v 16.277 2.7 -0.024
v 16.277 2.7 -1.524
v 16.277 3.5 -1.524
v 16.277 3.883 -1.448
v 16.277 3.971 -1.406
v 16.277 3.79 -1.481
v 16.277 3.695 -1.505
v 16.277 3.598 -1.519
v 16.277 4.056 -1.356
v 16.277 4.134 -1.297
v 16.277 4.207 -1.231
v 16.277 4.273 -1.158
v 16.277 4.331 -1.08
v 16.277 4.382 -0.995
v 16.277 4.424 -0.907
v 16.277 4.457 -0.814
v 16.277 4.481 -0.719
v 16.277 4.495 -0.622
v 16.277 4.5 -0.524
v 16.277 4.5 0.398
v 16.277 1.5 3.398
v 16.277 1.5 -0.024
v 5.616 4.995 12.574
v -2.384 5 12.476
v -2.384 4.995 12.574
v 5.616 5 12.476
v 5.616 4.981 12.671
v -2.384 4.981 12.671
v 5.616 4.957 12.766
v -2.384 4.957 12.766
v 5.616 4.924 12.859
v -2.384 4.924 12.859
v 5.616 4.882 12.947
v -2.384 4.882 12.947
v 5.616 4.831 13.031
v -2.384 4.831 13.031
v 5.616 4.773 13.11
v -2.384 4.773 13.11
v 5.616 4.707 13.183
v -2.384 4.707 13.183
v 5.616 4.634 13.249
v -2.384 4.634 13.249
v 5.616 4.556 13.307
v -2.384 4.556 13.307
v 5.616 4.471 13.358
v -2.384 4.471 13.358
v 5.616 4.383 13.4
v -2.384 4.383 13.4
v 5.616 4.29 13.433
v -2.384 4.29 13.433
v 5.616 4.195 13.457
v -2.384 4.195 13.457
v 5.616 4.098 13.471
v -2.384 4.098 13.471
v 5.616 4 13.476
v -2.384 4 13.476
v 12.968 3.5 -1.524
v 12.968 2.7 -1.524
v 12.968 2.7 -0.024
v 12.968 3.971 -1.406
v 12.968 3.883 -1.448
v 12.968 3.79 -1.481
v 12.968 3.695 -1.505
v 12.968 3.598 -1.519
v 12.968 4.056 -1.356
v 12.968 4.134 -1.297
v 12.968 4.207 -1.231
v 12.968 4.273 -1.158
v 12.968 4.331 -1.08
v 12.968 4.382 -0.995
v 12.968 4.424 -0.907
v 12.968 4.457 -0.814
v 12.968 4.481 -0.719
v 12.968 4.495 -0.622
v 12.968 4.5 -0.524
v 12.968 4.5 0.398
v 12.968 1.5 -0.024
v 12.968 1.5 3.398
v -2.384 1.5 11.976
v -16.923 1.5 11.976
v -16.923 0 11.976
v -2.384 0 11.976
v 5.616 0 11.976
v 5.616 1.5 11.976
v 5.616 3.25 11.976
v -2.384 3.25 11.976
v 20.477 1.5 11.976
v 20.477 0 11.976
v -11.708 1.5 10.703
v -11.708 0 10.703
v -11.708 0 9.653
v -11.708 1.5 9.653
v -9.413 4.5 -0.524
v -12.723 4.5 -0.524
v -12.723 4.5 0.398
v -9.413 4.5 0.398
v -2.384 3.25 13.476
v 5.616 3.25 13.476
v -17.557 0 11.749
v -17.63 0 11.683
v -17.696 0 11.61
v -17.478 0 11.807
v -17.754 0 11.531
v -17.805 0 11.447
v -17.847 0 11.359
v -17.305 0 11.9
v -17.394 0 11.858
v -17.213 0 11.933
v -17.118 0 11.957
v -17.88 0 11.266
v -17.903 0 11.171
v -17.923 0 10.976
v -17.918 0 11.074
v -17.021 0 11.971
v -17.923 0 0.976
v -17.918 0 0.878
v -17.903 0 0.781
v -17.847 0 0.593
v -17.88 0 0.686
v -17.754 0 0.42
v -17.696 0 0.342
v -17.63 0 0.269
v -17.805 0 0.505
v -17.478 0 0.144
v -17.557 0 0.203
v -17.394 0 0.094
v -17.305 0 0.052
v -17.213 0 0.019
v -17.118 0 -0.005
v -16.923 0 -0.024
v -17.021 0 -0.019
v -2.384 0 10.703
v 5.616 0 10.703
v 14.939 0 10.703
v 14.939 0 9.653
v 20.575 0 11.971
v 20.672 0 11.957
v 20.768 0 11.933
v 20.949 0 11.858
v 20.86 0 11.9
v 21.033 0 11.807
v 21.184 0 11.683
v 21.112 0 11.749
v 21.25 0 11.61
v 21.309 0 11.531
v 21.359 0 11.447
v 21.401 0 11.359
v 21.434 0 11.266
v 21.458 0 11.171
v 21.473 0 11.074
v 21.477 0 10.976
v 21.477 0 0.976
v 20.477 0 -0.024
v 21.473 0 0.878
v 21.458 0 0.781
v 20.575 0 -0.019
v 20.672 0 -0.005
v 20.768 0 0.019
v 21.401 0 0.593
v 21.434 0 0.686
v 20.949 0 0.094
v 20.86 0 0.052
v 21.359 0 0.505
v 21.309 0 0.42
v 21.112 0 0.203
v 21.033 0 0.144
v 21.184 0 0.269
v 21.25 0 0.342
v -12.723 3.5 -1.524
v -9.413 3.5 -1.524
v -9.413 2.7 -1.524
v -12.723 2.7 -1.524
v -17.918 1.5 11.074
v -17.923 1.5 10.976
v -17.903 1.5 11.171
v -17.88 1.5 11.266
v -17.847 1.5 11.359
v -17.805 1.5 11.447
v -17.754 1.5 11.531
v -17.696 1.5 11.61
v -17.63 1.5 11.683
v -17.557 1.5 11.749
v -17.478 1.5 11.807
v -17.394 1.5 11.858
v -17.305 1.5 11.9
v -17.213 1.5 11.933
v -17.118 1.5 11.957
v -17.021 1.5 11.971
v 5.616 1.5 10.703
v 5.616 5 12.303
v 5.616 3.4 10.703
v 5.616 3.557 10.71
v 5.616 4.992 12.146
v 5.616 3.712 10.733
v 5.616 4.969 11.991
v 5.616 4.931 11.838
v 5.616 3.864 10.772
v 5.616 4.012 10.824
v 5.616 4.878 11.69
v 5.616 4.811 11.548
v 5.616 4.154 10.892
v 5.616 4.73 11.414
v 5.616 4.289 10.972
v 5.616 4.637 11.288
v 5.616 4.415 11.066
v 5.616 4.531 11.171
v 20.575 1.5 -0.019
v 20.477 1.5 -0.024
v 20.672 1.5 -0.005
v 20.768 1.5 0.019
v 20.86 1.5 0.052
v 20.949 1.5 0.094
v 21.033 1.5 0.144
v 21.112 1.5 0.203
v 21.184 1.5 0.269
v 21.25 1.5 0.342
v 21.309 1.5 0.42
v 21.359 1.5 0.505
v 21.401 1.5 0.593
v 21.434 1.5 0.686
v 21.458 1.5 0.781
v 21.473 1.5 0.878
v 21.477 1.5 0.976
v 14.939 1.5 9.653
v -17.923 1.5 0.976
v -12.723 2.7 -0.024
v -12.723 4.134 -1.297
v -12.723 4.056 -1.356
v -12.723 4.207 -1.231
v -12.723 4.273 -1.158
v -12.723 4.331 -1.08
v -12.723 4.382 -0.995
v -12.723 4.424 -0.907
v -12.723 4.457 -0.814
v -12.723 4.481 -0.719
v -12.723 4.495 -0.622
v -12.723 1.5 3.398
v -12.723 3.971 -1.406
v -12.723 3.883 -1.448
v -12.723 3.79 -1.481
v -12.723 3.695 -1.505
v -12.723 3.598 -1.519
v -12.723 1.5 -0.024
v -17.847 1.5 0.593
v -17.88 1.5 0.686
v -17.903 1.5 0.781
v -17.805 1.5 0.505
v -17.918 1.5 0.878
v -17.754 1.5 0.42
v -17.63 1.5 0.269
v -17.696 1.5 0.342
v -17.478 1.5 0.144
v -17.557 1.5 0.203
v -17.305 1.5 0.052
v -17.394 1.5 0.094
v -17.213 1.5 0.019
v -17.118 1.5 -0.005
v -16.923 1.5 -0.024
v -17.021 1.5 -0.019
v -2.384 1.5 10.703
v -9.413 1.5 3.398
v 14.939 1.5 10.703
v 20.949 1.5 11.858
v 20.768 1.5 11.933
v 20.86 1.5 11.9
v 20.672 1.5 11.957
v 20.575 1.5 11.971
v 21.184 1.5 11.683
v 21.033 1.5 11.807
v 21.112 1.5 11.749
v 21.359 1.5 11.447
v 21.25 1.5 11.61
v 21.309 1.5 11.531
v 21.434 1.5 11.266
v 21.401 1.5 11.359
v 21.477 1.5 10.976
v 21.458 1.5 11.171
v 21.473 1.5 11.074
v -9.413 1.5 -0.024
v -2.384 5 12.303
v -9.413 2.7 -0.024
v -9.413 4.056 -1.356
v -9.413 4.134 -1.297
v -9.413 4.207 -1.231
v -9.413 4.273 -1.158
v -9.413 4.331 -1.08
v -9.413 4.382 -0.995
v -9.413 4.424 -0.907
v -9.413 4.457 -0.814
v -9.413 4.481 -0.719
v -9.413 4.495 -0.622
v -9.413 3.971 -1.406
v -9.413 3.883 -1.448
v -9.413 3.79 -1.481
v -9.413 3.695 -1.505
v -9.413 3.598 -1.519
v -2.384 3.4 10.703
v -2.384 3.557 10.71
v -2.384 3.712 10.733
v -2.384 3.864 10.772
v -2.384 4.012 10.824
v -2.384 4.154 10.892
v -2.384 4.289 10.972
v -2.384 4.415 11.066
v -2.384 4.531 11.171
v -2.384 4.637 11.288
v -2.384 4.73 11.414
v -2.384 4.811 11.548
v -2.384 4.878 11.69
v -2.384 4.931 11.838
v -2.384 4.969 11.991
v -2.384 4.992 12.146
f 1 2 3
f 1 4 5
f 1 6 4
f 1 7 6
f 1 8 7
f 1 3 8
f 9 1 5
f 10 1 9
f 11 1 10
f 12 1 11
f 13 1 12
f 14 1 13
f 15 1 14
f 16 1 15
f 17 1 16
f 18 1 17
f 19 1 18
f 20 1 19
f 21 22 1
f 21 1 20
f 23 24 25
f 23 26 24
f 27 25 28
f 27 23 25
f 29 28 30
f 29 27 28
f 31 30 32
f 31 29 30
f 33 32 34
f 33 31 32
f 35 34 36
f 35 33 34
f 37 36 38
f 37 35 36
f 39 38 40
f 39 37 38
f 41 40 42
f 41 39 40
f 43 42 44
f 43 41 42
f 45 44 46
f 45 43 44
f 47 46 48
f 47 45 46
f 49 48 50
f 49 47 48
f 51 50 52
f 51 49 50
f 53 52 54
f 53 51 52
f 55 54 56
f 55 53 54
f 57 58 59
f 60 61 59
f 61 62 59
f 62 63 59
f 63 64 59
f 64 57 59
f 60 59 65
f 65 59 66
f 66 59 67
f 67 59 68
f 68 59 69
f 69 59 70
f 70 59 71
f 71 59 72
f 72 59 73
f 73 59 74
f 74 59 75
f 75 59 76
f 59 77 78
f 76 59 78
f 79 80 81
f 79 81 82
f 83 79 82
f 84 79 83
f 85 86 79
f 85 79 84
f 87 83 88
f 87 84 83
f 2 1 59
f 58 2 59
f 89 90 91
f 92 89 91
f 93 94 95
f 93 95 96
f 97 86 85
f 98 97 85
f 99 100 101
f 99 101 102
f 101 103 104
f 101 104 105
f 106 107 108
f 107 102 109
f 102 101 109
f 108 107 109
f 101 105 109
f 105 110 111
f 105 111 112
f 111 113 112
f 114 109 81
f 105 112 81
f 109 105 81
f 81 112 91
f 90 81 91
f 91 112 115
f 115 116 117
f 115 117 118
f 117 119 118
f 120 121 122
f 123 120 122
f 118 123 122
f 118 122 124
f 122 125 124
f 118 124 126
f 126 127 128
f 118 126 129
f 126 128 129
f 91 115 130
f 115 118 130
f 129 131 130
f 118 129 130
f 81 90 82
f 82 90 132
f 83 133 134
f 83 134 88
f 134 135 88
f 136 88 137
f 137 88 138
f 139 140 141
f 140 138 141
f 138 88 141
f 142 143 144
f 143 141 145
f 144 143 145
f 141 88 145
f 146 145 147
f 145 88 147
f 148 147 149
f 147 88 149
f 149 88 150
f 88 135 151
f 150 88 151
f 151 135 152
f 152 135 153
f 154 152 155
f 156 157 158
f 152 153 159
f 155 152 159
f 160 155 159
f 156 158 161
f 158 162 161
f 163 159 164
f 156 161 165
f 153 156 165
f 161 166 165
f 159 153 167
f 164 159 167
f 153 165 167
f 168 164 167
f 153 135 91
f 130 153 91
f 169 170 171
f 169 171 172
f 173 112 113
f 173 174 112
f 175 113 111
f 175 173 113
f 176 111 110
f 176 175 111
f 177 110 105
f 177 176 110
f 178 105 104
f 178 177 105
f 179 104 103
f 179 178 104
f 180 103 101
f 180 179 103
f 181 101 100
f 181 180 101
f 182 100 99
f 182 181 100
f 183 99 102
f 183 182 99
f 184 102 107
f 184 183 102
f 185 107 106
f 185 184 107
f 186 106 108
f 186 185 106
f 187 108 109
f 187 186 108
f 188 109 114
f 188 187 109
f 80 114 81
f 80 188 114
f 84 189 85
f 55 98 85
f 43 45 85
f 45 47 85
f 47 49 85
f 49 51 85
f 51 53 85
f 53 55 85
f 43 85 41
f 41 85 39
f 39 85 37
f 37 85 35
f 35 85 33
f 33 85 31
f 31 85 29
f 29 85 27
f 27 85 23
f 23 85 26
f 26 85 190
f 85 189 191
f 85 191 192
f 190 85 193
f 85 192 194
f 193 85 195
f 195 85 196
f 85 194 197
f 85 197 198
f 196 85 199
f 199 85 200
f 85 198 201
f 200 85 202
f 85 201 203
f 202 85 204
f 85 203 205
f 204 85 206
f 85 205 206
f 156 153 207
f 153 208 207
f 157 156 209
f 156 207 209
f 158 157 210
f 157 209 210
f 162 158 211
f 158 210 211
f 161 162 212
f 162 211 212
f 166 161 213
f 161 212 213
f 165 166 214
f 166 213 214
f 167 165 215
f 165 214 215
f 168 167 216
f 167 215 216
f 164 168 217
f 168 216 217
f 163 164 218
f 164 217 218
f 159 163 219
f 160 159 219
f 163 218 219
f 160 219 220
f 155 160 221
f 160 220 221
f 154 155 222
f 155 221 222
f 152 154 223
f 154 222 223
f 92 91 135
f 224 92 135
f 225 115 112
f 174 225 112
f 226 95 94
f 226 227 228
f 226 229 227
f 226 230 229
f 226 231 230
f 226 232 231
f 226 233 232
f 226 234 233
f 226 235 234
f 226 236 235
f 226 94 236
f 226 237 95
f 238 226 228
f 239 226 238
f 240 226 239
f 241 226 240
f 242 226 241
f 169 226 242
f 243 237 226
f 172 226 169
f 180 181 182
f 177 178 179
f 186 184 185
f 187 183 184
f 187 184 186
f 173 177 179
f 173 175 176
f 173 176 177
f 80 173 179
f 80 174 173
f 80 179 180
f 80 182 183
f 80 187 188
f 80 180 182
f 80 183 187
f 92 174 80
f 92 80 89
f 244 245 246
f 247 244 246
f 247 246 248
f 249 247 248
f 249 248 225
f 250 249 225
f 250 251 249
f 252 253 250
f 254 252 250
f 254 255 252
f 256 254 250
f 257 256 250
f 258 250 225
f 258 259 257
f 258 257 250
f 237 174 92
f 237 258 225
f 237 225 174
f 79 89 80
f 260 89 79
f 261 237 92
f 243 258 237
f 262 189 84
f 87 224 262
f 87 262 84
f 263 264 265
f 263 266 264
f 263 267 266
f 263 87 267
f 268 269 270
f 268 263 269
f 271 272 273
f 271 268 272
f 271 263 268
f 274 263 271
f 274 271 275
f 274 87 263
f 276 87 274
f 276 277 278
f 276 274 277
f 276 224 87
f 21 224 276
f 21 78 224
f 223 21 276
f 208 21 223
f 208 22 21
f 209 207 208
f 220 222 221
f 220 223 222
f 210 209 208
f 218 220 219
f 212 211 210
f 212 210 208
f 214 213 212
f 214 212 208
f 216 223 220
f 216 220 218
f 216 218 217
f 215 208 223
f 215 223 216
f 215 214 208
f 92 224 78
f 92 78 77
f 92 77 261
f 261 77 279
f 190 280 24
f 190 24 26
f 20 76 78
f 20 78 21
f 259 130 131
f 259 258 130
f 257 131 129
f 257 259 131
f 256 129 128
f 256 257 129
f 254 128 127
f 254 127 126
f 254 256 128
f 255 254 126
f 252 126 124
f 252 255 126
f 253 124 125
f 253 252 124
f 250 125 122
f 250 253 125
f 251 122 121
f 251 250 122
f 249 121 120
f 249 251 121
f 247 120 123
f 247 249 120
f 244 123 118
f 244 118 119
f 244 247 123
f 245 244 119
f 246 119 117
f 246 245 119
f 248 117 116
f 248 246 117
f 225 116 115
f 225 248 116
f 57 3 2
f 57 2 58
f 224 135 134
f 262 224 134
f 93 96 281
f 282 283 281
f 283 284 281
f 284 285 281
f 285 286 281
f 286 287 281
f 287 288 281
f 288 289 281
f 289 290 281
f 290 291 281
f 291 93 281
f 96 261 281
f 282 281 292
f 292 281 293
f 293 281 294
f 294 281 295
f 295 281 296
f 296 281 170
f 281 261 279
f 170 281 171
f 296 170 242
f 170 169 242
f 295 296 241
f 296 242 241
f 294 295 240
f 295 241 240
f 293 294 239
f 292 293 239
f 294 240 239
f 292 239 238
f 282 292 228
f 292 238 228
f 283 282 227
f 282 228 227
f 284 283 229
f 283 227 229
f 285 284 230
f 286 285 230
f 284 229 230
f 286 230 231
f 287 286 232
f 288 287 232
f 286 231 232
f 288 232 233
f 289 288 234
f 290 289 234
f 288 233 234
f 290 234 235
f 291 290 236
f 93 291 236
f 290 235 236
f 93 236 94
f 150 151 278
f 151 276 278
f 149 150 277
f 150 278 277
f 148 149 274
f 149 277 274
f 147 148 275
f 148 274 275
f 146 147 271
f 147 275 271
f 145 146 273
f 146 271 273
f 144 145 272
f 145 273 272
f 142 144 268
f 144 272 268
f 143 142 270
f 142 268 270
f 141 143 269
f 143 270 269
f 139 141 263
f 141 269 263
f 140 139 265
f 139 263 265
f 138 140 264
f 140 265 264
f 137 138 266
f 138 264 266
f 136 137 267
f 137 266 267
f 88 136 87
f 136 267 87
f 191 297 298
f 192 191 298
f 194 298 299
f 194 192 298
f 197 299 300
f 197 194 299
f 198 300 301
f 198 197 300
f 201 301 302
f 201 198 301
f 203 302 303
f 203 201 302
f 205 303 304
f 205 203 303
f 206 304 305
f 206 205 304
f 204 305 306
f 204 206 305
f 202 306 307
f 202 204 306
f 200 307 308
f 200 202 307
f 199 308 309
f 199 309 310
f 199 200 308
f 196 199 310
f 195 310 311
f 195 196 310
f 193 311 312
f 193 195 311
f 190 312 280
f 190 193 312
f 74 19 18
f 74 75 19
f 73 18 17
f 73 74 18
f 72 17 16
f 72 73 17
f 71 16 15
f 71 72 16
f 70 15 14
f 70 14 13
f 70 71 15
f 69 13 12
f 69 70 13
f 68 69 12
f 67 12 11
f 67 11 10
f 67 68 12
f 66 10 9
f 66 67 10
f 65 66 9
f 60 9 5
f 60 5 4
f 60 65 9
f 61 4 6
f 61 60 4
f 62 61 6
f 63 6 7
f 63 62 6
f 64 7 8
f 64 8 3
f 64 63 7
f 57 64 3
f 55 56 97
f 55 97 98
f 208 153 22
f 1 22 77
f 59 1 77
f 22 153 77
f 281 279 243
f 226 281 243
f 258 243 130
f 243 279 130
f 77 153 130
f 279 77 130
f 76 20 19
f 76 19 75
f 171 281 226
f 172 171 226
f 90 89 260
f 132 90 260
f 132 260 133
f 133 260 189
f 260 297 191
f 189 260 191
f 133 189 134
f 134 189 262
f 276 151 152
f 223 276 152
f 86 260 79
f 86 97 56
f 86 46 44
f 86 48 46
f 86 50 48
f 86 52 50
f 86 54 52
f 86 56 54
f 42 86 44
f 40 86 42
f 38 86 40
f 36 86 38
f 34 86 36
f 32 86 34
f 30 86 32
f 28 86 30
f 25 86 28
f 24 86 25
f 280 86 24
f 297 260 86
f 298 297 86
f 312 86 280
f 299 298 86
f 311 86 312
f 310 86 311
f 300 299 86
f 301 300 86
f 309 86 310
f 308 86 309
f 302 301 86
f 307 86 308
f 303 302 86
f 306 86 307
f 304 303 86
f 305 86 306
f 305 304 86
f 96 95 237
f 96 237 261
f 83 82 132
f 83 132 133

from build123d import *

# Parameters (mm, degrees)
SKETCH1_W                 = 3
SKETCH1_H                 = 1.629773482
SKETCH1_H_2               = 1.605700765
BOSS_EXTRUDE21_DEPTH      = 1.5
BOSS_EXTRUDE22_DEPTH      = 0.0001
BOSS_EXTRUDE22_DEPTH_BACK = 5
SKETCH4_W                 = 8
SKETCH4_H                 = 1.27322458
SKETCH5_W                 = 8
SKETCH5_H                 = 1.75
BOSS_EXTRUDE23_DEPTH      = 1.5
SKETCH6_W                 = 3.309716912
SKETCH6_H                 = 3.42211522
SKETCH6_W_2               = 3.309716913
BOSS_EXTRUDE24_DEPTH      = 3
SKETCH8_W                 = 3.309716912
SKETCH8_H                 = 1.8
SKETCH8_W_2               = 3.309716913
BOSS_EXTRUDE26_DEPTH      = 1.5
FILLET1_R                 = 1
FILLET2_R                 = 1
CHAMFER4_SIZE             = 3
FILLET3_R                 = 1.6


with BuildPart() as part:
    # Sketch1 → Boss-Extrude21 (new body)
    # profile 1 of 3: a face of its own
    with BuildSketch(Plane(origin=(0, 0, 0), x_dir=(1, 0, 0), z_dir=(0, 1, 0))):
        with Locations((14.277336143, -0.790814024)):
            Rectangle(SKETCH1_W, SKETCH1_H)
    # profile 2 of 3: a face of its own
    with BuildSketch(Plane(origin=(0, 0, 0), x_dir=(1, 0, 0), z_dir=(0, 1, 0))):
        Polygon((-2.384327038, -10.702702703), (-11.708098218, -10.702702703), (-11.708098218, -9.652730884), (14.939444142, -9.652730884), (14.939444142, -10.702702703), (5.615672962, -10.702702703), (5.615672962, -11.975927283), (21.477336143, -11.975927283), (21.477336143, 0.024072717), (15.777336143, 0.024072717), (15.777336143, -1.605700765), (12.777336143, -1.605700765), (12.777336143, 0.024072717), (-17.922663857, 0.024072717), (-17.922663857, -11.975927283), (-2.384327038, -11.975927283), align=None)
        with Locations((-10.768292904, -0.870035762)):
            Rectangle(SKETCH1_W, SKETCH1_H_2, mode=Mode.SUBTRACT)
    # profile 3 of 3: a face of its own
    with BuildSketch(Plane(origin=(0, 0, 0), x_dir=(1, 0, 0), z_dir=(0, 1, 0))):
        with Locations((-10.768292904, -0.870035762)):
            Rectangle(SKETCH1_W, SKETCH1_H_2)
    extrude(amount=BOSS_EXTRUDE21_DEPTH)

    # Sketch4 → Boss-Extrude22 (add, two sides: drawn at the far end of the back side and taken through both)
    with BuildSketch(Plane.XZ.offset(-BOSS_EXTRUDE22_DEPTH_BACK)):
        with Locations((1.615672962, 11.339314993)):
            Rectangle(SKETCH4_W, SKETCH4_H)
    extrude(amount=BOSS_EXTRUDE22_DEPTH + BOSS_EXTRUDE22_DEPTH_BACK)

    # Sketch5 → Boss-Extrude23 (add)
    with BuildSketch(Plane.XY.offset(11.975927283)):
        with Locations((1.615672962, 4.125)):
            Rectangle(SKETCH5_W, SKETCH5_H)
    extrude(amount=BOSS_EXTRUDE23_DEPTH)

    # Sketch6 → Boss-Extrude24 (add)
    with BuildSketch(Plane(origin=(0, 1.5, 0), x_dir=(1, 0, 0), z_dir=(0, 1, 0))):
        with Locations((14.622477687, -1.686984893)):
            Rectangle(SKETCH6_W, SKETCH6_H)
        with Locations((-11.0678054, -1.686984893)):
            Rectangle(SKETCH6_W_2, SKETCH6_H)
    extrude(amount=BOSS_EXTRUDE24_DEPTH)

    # Sketch8 → Boss-Extrude26 (add)
    with BuildSketch(Plane(origin=(0, 0, -0.024072717), x_dir=(-1, 0, 0), z_dir=(0, 0, -1))):
        with Locations((-14.622477687, 3.6)):
            Rectangle(SKETCH8_W, SKETCH8_H)
        with Locations((11.0678054, 3.6)):
            Rectangle(SKETCH8_W_2, SKETCH8_H)
    extrude(amount=BOSS_EXTRUDE26_DEPTH)

    # Fillet1
    fillet1_edges = [part.edges().sort_by_distance(p)[0] for p in [
        (-11.0678054, 4.5, -1.524072717),
        (1.615672962, 5, 13.475927283),
        (14.622477687, 4.5, -1.524072717),
    ]]
    fillet(fillet1_edges, radius=FILLET1_R)

    # Fillet2
    fillet2_edges = [part.edges().sort_by_distance(p)[0] for p in [
        (21.477336143, 0.75, 11.975927283),
        (-17.922663857, 0.75, 11.975927283),
        (-17.922663857, 0.75, -0.024072717),
        (21.477336143, 0.75, -0.024072717),
    ]]
    fillet(fillet2_edges, radius=FILLET2_R)

    # Chamfer4
    chamfer4_edges = [part.edges().sort_by_distance(p)[0] for p in [
        (14.622477687, 4.5, 3.398042503),
        (-11.0678054, 4.5, 3.398042503),
    ]]
    chamfer(chamfer4_edges, length=CHAMFER4_SIZE - 0.0001)  # a hair under: the kernel refuses the full size

    # Fillet3
    fillet3_edges = [part.edges().sort_by_distance(p)[0] for p in [
        (1.615672962, 5, 10.702702703),
    ]]
    fillet(fillet3_edges, radius=FILLET3_R)


solid = part.part
